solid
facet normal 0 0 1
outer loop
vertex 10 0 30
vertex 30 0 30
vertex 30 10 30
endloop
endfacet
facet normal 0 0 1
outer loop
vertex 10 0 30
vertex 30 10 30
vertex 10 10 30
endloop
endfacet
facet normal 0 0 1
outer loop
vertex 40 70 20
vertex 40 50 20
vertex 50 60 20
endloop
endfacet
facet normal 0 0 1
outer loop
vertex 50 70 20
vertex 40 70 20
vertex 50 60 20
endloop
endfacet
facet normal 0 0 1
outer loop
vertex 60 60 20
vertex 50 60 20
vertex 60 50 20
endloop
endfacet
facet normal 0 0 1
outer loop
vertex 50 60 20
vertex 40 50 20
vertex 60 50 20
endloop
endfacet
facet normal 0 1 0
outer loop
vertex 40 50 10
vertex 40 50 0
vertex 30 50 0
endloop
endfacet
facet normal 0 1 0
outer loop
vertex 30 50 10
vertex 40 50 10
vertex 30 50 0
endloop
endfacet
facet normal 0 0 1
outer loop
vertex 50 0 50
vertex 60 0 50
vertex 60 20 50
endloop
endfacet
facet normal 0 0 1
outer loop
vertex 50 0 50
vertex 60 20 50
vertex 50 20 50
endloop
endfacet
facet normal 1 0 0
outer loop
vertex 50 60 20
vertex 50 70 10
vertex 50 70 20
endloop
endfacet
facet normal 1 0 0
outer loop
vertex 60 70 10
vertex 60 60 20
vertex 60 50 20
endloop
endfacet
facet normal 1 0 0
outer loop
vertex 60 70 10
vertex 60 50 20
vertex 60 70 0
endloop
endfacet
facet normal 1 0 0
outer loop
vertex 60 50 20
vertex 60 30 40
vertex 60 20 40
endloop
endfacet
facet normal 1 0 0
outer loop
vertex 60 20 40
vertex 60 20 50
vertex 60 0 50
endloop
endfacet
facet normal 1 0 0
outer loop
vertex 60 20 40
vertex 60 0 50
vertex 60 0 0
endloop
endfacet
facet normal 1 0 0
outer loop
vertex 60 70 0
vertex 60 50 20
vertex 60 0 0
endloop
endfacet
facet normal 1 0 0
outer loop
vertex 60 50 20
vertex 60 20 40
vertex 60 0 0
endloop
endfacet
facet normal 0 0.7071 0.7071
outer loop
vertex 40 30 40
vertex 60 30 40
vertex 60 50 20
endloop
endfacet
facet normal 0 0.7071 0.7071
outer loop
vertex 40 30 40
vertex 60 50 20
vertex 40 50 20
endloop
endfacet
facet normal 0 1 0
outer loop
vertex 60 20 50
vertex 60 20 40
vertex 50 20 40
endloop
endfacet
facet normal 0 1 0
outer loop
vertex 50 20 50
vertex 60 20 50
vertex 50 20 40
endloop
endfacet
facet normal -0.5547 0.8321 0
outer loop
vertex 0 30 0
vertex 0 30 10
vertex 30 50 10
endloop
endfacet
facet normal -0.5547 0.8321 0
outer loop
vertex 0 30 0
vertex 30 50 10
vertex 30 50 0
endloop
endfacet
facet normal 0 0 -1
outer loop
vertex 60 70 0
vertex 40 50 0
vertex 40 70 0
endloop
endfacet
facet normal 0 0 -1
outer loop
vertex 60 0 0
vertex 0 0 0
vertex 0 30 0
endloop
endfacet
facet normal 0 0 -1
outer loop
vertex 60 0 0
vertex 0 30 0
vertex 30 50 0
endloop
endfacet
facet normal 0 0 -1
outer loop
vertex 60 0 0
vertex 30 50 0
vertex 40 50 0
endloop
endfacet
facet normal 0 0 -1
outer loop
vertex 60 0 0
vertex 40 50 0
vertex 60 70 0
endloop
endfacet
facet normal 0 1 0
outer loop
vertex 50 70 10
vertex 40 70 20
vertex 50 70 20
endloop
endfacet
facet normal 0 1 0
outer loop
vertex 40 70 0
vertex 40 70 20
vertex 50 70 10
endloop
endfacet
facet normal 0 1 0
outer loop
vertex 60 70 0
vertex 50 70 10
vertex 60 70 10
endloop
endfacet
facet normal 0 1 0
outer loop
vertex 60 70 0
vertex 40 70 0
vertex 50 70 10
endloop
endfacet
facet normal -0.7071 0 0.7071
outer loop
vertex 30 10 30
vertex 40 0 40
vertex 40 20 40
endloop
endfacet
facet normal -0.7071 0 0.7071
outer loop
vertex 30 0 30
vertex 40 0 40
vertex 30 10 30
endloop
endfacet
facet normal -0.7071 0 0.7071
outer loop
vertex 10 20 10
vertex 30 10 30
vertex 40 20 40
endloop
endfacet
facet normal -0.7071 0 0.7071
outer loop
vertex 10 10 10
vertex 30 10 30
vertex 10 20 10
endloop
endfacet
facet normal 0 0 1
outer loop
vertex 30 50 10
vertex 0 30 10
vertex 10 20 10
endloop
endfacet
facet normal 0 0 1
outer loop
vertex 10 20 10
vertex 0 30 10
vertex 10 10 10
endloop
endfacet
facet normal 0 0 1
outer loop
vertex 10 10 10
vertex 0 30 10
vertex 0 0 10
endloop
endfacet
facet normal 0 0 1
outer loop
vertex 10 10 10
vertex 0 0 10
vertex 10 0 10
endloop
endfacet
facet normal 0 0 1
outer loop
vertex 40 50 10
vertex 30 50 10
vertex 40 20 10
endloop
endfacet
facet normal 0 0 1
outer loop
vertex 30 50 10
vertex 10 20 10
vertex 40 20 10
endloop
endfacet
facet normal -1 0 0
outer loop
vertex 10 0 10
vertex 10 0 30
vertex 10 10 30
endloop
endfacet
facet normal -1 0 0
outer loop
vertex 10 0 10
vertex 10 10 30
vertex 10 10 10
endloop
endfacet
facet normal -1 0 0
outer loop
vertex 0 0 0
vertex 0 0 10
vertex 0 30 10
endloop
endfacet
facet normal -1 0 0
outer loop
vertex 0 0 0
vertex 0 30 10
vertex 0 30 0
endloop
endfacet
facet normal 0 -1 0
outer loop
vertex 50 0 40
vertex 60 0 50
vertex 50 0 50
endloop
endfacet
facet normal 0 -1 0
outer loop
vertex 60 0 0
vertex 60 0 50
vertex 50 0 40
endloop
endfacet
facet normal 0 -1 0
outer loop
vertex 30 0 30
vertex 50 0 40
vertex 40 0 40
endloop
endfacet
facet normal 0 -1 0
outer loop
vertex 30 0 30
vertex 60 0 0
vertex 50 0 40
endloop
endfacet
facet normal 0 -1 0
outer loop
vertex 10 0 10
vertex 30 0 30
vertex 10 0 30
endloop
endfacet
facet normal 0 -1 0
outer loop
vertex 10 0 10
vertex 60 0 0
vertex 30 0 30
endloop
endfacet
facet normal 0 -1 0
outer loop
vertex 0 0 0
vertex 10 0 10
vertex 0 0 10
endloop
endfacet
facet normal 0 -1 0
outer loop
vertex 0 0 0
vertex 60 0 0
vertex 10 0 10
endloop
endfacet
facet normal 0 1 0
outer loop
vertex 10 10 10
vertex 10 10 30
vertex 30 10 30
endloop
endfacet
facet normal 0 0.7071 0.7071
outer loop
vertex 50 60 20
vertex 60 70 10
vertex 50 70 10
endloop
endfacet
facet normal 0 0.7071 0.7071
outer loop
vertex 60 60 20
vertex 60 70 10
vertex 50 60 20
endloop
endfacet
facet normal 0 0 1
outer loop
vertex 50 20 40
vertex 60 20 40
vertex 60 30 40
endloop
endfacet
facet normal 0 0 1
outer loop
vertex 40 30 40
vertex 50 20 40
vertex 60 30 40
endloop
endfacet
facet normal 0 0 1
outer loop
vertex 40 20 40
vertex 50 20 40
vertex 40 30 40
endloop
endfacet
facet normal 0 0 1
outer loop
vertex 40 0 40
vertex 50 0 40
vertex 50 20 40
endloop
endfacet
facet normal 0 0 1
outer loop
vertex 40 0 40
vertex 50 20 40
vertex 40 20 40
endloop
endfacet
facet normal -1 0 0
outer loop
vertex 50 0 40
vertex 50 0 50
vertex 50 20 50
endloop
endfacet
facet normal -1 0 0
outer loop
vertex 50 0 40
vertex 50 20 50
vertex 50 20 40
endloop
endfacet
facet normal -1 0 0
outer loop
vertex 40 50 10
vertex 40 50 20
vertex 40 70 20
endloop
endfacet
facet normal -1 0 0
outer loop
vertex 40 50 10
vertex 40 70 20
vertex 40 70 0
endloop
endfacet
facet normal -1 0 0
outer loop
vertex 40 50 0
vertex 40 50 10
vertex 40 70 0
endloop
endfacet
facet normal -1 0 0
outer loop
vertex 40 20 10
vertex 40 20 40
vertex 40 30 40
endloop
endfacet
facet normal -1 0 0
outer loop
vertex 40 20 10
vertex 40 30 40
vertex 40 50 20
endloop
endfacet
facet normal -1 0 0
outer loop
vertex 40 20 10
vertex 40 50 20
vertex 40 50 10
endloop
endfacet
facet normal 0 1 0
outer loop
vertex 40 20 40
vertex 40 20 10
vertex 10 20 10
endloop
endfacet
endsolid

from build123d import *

# Parameters (mm, degrees)
BOSS_EXTRUDE1_DEPTH = 20
CUT_EXTRUDE1_DEPTH  = 10
BOSS_EXTRUDE2_DEPTH = 30
CHAMFER1_SIZE       = 20
CHAMFER2_SIZE       = 20
CHAMFER2_SIZE2      = 30
SKETCH4_W           = 20
SKETCH4_H           = 20
BOSS_EXTRUDE3_DEPTH = 20
CUT_EXTRUDE2_DEPTH  = 10


with BuildPart() as part:
    # Sketch1 → Boss-Extrude1 (new body)
    with BuildSketch(Plane(origin=(0, 0, 0), x_dir=(1, 0, 0), z_dir=(0, 1, 0))):
        Polygon((0, 0), (60, 0), (60, -50), (50, -50), (50, -40), (40, -40), (30, -30), (10, -30), (10, -10), (0, -10), align=None)
    extrude(amount=BOSS_EXTRUDE1_DEPTH)

    # Sketch2 → Cut-Extrude1 (cut)
    with BuildSketch(Plane(origin=(0, 20, 0), x_dir=(1, 0, 0), z_dir=(0, 1, 0))):
        Polygon((30, -30), (10, -10), (10, -30), align=None)
    extrude(amount=-CUT_EXTRUDE1_DEPTH, mode=Mode.SUBTRACT)

    # Sketch3 → Boss-Extrude2 (add)
    with BuildSketch(Plane(origin=(0, 20, 0), x_dir=(1, 0, 0), z_dir=(0, 1, 0))):
        Polygon((0, 0), (60, 0), (60, -40), (40, -40), (40, -10), (10, -10), (0, -10), align=None)
    extrude(amount=BOSS_EXTRUDE2_DEPTH)

    # Chamfer1
    chamfer1_edges = [part.edges().sort_by_distance(p)[0] for p in [
        (50, 50, 40),
    ]]
    chamfer(chamfer1_edges, length=CHAMFER1_SIZE)

    # Chamfer2
    chamfer2_edges = [part.edges().sort_by_distance(p)[0] for p in [
        (0, 50, 5),
    ]]
    chamfer2_side = [part.faces().sort_by_distance(p)[0] for p in [
        (0, 25, 5),
    ]]
    chamfer(chamfer2_edges, length=CHAMFER2_SIZE, length2=CHAMFER2_SIZE2, reference=chamfer2_side[0])

    # Sketch4 → Boss-Extrude3 (add)
    with BuildSketch(Plane(origin=(0, 50, 0), x_dir=(1, 0, 0), z_dir=(0, 1, 0))):
        with Locations((50, -10)):
            Rectangle(SKETCH4_W, SKETCH4_H)
    extrude(amount=BOSS_EXTRUDE3_DEPTH)

    # Sketch5 → Cut-Extrude2 (cut)
    with BuildSketch(Plane(origin=(60, 0, 0), x_dir=(0, 0, -1), z_dir=(1, 0, 0))):
        Polygon((-20, 70), (-10, 70), (-20, 60), align=None)
    extrude(amount=-CUT_EXTRUDE2_DEPTH, mode=Mode.SUBTRACT)


solid = part.part
